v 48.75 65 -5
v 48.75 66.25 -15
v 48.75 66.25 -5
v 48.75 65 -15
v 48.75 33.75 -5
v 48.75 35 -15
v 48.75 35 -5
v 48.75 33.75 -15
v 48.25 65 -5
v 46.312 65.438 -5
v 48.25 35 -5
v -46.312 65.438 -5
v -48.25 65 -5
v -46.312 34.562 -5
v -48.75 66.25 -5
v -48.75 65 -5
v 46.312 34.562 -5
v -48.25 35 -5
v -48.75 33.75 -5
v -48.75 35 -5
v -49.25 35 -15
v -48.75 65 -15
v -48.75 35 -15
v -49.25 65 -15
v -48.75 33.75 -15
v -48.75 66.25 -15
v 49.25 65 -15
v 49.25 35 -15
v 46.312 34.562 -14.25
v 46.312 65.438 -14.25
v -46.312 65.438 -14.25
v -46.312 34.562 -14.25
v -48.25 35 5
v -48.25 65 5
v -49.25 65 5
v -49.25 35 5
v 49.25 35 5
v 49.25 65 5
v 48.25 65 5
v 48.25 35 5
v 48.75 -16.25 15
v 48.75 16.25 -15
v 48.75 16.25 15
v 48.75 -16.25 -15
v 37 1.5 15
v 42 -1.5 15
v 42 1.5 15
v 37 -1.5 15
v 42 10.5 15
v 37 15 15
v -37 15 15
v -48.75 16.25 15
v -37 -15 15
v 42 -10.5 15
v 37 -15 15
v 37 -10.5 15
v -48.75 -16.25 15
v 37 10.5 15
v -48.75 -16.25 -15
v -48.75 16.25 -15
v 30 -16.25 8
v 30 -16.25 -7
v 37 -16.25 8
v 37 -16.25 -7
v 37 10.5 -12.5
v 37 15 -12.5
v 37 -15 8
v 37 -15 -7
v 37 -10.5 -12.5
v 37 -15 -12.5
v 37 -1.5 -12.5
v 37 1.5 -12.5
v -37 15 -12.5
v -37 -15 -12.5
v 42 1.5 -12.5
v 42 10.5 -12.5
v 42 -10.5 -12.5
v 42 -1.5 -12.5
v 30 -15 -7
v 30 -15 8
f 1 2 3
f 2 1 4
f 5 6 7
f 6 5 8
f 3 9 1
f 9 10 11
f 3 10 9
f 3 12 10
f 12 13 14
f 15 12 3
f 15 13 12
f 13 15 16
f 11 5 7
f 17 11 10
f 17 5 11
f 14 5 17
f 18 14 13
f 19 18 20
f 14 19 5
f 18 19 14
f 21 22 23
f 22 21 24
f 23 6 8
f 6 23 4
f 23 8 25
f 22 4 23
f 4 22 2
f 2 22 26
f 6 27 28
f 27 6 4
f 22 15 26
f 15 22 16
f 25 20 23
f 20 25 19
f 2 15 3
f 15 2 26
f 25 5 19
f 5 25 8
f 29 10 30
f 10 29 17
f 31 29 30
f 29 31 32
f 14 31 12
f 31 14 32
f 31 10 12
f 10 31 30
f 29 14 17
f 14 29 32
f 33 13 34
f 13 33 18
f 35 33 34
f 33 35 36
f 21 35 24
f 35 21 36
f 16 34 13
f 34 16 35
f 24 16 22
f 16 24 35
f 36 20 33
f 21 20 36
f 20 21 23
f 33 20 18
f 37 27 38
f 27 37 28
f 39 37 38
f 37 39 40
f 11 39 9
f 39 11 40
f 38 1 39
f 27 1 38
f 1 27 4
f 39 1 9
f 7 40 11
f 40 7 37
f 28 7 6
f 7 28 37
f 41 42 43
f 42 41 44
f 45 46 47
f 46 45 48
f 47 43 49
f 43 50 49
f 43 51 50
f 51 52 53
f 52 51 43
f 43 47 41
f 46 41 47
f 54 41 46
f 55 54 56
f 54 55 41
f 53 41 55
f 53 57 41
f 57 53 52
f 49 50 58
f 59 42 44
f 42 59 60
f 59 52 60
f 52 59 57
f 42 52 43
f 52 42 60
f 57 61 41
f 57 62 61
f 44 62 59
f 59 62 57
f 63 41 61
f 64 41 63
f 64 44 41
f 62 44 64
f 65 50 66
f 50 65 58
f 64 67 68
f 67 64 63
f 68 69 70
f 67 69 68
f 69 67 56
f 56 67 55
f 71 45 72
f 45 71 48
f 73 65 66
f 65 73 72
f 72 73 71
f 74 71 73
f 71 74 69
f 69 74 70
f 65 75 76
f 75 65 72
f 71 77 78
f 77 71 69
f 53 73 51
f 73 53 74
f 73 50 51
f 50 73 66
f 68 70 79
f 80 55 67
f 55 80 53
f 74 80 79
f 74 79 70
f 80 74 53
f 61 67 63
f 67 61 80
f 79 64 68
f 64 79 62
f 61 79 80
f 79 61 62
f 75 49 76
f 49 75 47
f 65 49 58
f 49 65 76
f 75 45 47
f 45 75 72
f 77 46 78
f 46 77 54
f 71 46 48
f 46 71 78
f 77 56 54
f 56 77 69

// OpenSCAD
// wunobot vapir battery module

box_length = 95;
box_width = 30;
box_height = 30;

box_thickness = 2.5;
inner_width_offset = 21;

usb_x = 7;
usb_y = 15;
usb_x_offset = 30;
usb_z_offset = -7;

wire_size = 9;
wire_depth = 5;
wire_distance = 11;
wire_offset = -5;

top_thickness = 10;

module top()
{
	translate([0,50,-box_height/2+top_thickness/2])
	cube([box_length+box_thickness, box_width+box_thickness, top_thickness], true);
}

difference()
{
	top();

	translate([0,2.5,0])
	scale(0.95,1,1)
	top();
}

module top_fins()
{
	translate([-box_thickness/2,0,-5])
	cube([1, box_width, 20], true);

	translate([box_length+box_thickness/2,0,-5])
	cube([1, box_width, 20], true);
}

translate([-box_length/2,50,0])
top_fins();



module battery_box()
{
	difference()
	{
		cube([box_length+box_thickness, box_width+box_thickness, box_height], true);
		translate([0,0,box_thickness])
		cube([box_length-inner_width_offset, box_width, box_height], true);
	}
}

module usb_hole()
{
	translate([usb_x_offset,-box_width/2-box_thickness/2,usb_z_offset])
	cube([usb_x,box_thickness/2,usb_y]);
}

module wire_routes()
{
	translate([box_length/2-inner_width_offset/2+wire_depth/2,wire_distance,box_thickness])
	cube([wire_depth,wire_size,box_height],true);

	translate([box_length/2-inner_width_offset/2+wire_depth/2,10-wire_distance,box_thickness])
	cube([wire_depth,wire_size,box_height],true);

}

module box()
{
	difference()
	{
		battery_box();
		usb_hole();
	}
}

difference()
{
	box();
	translate([0,wire_offset,0])
	wire_routes();

}
